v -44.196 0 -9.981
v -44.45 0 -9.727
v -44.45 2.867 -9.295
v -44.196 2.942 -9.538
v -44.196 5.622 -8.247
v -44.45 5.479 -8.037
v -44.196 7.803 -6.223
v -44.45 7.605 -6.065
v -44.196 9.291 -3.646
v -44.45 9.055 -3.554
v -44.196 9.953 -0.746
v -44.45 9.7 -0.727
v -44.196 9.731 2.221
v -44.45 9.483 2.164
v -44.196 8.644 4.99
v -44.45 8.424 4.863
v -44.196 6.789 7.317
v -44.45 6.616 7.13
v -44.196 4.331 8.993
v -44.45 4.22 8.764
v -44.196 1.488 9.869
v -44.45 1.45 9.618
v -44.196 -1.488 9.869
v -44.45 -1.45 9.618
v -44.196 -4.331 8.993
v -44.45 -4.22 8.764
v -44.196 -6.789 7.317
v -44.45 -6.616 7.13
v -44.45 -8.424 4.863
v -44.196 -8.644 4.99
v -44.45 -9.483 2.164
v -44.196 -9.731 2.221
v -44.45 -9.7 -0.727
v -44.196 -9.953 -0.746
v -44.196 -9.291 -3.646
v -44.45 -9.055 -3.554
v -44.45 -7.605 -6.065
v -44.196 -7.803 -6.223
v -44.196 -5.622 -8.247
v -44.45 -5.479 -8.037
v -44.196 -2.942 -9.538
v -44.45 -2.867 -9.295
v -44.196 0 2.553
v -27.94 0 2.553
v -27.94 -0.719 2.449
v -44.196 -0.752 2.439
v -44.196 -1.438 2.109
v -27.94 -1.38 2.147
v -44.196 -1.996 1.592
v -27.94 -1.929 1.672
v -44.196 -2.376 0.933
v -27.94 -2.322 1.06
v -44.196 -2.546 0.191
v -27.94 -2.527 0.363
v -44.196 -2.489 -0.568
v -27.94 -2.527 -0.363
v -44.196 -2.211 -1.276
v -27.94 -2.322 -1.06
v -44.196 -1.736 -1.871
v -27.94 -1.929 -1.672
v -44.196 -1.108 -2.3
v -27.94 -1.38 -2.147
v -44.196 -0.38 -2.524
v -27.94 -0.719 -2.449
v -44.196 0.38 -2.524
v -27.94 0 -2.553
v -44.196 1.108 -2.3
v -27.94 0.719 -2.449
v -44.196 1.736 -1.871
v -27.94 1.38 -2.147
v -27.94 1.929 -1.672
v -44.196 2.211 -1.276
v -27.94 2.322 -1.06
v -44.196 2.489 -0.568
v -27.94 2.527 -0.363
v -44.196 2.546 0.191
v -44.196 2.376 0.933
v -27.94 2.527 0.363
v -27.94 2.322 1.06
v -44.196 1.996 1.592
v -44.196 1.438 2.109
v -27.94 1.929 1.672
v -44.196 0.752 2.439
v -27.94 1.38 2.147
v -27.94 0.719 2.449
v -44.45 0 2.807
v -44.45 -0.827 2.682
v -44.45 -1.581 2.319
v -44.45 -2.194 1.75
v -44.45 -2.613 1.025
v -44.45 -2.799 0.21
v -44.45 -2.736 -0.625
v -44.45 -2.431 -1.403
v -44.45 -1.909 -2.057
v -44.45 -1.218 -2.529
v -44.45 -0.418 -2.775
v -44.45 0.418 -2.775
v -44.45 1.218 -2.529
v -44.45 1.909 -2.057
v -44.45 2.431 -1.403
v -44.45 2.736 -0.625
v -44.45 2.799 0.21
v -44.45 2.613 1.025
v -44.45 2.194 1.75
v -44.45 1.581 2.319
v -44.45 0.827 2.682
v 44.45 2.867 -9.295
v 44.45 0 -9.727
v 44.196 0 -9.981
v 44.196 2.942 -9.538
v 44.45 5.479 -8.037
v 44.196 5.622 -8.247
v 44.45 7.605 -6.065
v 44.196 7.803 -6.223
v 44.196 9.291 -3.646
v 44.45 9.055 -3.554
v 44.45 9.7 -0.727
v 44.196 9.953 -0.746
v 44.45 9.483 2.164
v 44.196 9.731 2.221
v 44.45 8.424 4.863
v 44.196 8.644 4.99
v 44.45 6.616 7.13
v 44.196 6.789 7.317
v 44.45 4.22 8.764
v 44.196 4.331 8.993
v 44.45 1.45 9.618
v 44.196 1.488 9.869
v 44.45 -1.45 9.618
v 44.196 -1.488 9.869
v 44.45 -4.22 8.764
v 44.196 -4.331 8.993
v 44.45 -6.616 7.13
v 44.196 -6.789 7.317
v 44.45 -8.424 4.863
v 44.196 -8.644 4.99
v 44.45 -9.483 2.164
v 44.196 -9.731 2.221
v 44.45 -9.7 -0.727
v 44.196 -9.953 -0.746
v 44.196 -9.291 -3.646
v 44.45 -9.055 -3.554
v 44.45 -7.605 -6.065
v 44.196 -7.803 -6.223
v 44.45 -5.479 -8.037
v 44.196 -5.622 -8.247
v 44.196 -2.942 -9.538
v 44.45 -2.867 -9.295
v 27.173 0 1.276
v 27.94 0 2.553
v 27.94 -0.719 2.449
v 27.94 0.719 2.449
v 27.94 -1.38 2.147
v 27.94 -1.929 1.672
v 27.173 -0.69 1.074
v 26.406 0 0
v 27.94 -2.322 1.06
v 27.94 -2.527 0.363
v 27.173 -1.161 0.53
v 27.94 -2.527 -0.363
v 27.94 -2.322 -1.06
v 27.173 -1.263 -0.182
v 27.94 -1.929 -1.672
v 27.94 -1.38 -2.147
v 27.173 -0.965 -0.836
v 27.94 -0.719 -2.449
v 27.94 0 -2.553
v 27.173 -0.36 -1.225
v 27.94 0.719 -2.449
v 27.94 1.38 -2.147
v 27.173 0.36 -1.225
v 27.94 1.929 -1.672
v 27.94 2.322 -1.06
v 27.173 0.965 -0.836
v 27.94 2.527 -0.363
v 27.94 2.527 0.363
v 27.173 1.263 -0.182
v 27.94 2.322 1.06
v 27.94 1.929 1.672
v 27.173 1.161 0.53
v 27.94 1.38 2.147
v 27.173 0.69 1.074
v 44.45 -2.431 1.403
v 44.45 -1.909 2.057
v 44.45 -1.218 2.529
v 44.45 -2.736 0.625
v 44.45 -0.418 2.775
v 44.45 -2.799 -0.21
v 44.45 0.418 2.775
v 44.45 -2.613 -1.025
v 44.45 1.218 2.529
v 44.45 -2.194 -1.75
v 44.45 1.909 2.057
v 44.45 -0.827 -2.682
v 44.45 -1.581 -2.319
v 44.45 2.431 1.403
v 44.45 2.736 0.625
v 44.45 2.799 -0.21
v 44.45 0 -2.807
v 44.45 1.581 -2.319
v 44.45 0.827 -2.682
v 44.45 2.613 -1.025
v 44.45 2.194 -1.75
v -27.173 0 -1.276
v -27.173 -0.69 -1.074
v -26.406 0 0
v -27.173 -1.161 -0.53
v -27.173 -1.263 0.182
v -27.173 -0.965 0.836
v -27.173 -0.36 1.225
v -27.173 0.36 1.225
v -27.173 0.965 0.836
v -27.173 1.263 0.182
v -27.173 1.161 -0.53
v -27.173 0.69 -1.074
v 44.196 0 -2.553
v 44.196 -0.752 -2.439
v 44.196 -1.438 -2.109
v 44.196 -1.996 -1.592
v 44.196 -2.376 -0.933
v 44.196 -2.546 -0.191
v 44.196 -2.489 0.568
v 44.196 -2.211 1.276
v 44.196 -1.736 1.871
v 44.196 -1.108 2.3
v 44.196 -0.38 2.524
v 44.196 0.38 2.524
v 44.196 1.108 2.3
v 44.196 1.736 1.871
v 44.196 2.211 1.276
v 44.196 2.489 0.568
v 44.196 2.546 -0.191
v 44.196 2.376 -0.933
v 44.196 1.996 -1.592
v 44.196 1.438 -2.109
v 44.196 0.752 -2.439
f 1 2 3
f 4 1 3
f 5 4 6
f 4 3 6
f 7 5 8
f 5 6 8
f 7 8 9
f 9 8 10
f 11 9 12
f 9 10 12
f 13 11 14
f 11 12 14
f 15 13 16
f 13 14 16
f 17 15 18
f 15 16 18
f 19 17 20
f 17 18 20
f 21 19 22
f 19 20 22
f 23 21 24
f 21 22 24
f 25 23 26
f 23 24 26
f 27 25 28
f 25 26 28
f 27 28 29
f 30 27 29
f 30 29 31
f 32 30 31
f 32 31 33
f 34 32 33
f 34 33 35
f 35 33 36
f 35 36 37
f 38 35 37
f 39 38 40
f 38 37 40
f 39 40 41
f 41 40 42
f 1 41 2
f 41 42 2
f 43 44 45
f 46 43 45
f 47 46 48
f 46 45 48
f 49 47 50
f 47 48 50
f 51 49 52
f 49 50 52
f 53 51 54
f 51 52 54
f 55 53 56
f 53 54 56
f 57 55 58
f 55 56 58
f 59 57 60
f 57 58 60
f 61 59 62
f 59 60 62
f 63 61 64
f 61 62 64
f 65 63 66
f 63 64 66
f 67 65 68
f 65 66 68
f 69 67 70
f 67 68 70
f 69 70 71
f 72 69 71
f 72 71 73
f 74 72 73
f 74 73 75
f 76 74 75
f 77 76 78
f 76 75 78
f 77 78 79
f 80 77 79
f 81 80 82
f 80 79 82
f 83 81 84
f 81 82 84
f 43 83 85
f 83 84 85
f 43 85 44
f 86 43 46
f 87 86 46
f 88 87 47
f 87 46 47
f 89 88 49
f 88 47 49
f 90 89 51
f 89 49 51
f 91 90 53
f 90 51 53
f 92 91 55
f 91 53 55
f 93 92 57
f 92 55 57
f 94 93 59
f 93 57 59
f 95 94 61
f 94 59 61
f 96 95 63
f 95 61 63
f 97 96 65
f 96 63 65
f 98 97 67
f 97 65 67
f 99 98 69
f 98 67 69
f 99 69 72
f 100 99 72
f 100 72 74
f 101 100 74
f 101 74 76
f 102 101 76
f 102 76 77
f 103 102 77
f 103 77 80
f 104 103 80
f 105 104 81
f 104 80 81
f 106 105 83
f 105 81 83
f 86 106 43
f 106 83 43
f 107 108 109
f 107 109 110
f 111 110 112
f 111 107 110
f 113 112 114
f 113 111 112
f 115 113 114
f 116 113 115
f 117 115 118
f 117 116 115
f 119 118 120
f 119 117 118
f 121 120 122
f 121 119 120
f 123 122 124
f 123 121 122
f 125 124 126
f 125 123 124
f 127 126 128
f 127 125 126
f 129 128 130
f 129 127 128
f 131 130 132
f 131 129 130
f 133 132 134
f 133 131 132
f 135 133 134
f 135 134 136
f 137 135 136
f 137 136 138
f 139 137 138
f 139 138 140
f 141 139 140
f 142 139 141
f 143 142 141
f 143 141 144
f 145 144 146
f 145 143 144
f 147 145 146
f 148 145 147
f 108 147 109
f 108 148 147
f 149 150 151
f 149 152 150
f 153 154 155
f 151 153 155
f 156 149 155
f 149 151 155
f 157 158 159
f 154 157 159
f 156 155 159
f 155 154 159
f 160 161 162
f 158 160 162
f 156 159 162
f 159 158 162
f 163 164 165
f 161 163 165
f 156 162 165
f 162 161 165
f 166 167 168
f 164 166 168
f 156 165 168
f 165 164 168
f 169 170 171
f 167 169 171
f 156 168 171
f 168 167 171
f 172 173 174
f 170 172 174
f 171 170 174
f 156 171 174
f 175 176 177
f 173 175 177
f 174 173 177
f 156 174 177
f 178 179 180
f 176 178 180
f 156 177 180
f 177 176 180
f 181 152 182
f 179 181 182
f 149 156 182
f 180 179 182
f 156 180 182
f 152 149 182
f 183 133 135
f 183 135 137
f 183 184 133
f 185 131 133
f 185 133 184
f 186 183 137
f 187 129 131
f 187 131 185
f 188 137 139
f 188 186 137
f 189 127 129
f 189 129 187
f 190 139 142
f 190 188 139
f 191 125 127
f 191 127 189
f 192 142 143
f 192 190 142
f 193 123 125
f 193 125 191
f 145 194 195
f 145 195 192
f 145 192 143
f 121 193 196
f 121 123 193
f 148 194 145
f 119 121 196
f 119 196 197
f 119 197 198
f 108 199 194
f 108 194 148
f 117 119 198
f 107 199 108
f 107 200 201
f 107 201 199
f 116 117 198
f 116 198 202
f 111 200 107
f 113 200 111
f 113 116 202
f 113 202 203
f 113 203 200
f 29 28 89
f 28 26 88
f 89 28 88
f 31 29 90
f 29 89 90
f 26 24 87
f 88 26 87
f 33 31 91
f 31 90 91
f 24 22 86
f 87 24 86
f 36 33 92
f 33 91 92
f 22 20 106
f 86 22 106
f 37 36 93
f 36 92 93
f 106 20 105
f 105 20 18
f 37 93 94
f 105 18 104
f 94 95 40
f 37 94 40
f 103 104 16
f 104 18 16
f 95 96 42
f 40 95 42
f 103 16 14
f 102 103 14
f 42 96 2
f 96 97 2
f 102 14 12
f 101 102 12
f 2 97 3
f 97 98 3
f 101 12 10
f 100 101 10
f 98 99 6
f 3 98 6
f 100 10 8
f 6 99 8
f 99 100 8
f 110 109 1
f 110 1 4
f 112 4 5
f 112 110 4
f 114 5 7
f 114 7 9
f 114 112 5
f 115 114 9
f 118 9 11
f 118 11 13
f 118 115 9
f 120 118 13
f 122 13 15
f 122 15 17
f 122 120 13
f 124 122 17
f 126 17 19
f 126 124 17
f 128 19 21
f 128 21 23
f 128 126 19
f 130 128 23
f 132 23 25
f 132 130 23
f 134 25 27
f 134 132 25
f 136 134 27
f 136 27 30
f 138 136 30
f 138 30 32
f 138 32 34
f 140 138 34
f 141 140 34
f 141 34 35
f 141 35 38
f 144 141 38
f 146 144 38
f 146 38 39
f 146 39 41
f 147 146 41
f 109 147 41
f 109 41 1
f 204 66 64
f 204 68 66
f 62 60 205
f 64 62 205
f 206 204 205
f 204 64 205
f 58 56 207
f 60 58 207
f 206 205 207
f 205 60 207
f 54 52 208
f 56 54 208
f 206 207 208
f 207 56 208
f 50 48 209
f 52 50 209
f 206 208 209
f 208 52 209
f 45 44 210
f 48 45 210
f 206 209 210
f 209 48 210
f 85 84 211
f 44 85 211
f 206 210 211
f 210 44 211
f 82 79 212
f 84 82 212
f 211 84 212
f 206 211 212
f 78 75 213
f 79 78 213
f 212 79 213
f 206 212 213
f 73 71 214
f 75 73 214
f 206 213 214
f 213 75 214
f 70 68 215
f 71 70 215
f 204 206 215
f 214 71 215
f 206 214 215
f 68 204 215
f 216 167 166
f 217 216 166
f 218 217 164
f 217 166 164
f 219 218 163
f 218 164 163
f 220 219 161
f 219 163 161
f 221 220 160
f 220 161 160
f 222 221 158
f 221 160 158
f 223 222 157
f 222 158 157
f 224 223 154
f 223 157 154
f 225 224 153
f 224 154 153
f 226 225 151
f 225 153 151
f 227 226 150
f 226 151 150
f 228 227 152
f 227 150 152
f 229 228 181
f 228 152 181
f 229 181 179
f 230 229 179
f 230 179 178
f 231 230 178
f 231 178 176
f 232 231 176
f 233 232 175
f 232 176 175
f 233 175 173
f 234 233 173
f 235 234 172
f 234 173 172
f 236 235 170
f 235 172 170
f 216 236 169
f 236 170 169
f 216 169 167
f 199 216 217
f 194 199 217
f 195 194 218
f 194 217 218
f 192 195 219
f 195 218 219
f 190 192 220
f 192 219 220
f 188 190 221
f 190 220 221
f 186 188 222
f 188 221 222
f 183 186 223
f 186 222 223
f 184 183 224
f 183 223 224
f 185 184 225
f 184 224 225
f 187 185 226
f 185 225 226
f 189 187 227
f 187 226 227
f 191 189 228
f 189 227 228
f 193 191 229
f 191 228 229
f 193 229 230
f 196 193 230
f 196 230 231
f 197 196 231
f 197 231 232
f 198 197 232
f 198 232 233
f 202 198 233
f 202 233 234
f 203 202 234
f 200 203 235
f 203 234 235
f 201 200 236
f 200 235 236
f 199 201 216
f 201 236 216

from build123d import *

# Parameters (mm, degrees)
SKETCH2_R                             = 9.980949939
BOSS_EXTRUDE1_DEPTH                   = 44.45
F_1_4_20_TAPPED_HOLE1_D               = 5.1054
F_1_4_20_TAPPED_HOLE1_DEPTH           = 16.51
F_1_4_20_TAPPED_HOLE1_TIP             = 1.533816902
F_1_4_20_TAPPED_HOLE1_ON_FACE_2_D     = 5.1054
F_1_4_20_TAPPED_HOLE1_ON_FACE_2_DEPTH = 16.51
F_1_4_20_TAPPED_HOLE1_ON_FACE_2_TIP   = 1.533816902
F_1_4_20_TAPPED_HOLE1_ON_FACE_3_D     = 5.1054
F_1_4_20_TAPPED_HOLE1_ON_FACE_3_DEPTH = 16.51
F_1_4_20_TAPPED_HOLE1_ON_FACE_3_TIP   = 1.533816902
CHAMFER1_SIZE                         = 0.254


with BuildPart() as part:
    # Sketch2 → Boss-Extrude1 (new body, symmetric)
    with BuildSketch(Plane(origin=(0, 0, 0), x_dir=(0, 0, -1), z_dir=(1, 0, 0))):
        Circle(SKETCH2_R)
    extrude(amount=BOSS_EXTRUDE1_DEPTH, both=True)

    # 1/4-20 Tapped Hole1
    with Locations(Plane(origin=(-44.45, 0, 0), x_dir=(0, 0, -1), z_dir=(-1, 0, 0))):
        with Locations((0, 0)):
            Hole(F_1_4_20_TAPPED_HOLE1_D / 2, depth=F_1_4_20_TAPPED_HOLE1_DEPTH)
            with Locations((0, 0, -(F_1_4_20_TAPPED_HOLE1_DEPTH + F_1_4_20_TAPPED_HOLE1_TIP / 2))):  # 118° drill point
                Cone(0, F_1_4_20_TAPPED_HOLE1_D / 2, F_1_4_20_TAPPED_HOLE1_TIP, mode=Mode.SUBTRACT)

    # 1/4-20 Tapped Hole1 on face 2
    with Locations(Plane(origin=(14.956085126, -44.657762317, 0), x_dir=(0, 0, -1), z_dir=(-1, 0, 0))):
        with Locations((0, 0)):
            Hole(F_1_4_20_TAPPED_HOLE1_ON_FACE_2_D / 2, depth=F_1_4_20_TAPPED_HOLE1_ON_FACE_2_DEPTH)
            with Locations((0, 0, -(F_1_4_20_TAPPED_HOLE1_ON_FACE_2_DEPTH + F_1_4_20_TAPPED_HOLE1_ON_FACE_2_TIP / 2))):  # 118° drill point
                Cone(0, F_1_4_20_TAPPED_HOLE1_ON_FACE_2_D / 2, F_1_4_20_TAPPED_HOLE1_ON_FACE_2_TIP, mode=Mode.SUBTRACT)

    # 1/4-20 Tapped Hole1 on face 3
    with Locations(Plane(origin=(44.45, 0, 0), x_dir=(0, 0, 1), z_dir=(1, 0, 0))):
        with Locations((0, 0)):
            Hole(F_1_4_20_TAPPED_HOLE1_ON_FACE_3_D / 2, depth=F_1_4_20_TAPPED_HOLE1_ON_FACE_3_DEPTH)
            with Locations((0, 0, -(F_1_4_20_TAPPED_HOLE1_ON_FACE_3_DEPTH + F_1_4_20_TAPPED_HOLE1_ON_FACE_3_TIP / 2))):  # 118° drill point
                Cone(0, F_1_4_20_TAPPED_HOLE1_ON_FACE_3_D / 2, F_1_4_20_TAPPED_HOLE1_ON_FACE_3_TIP, mode=Mode.SUBTRACT)

    # Chamfer1
    chamfer1_edges = [part.edges().sort_by_distance(p)[0] for p in [
        (-44.45, 0, 9.980949939),
        (44.45, 0, 9.980949939),
        (-44.45, 0, -2.5527),
        (44.45, 0, 2.5527),
    ]]
    chamfer(chamfer1_edges, length=CHAMFER1_SIZE)


solid = part.part
